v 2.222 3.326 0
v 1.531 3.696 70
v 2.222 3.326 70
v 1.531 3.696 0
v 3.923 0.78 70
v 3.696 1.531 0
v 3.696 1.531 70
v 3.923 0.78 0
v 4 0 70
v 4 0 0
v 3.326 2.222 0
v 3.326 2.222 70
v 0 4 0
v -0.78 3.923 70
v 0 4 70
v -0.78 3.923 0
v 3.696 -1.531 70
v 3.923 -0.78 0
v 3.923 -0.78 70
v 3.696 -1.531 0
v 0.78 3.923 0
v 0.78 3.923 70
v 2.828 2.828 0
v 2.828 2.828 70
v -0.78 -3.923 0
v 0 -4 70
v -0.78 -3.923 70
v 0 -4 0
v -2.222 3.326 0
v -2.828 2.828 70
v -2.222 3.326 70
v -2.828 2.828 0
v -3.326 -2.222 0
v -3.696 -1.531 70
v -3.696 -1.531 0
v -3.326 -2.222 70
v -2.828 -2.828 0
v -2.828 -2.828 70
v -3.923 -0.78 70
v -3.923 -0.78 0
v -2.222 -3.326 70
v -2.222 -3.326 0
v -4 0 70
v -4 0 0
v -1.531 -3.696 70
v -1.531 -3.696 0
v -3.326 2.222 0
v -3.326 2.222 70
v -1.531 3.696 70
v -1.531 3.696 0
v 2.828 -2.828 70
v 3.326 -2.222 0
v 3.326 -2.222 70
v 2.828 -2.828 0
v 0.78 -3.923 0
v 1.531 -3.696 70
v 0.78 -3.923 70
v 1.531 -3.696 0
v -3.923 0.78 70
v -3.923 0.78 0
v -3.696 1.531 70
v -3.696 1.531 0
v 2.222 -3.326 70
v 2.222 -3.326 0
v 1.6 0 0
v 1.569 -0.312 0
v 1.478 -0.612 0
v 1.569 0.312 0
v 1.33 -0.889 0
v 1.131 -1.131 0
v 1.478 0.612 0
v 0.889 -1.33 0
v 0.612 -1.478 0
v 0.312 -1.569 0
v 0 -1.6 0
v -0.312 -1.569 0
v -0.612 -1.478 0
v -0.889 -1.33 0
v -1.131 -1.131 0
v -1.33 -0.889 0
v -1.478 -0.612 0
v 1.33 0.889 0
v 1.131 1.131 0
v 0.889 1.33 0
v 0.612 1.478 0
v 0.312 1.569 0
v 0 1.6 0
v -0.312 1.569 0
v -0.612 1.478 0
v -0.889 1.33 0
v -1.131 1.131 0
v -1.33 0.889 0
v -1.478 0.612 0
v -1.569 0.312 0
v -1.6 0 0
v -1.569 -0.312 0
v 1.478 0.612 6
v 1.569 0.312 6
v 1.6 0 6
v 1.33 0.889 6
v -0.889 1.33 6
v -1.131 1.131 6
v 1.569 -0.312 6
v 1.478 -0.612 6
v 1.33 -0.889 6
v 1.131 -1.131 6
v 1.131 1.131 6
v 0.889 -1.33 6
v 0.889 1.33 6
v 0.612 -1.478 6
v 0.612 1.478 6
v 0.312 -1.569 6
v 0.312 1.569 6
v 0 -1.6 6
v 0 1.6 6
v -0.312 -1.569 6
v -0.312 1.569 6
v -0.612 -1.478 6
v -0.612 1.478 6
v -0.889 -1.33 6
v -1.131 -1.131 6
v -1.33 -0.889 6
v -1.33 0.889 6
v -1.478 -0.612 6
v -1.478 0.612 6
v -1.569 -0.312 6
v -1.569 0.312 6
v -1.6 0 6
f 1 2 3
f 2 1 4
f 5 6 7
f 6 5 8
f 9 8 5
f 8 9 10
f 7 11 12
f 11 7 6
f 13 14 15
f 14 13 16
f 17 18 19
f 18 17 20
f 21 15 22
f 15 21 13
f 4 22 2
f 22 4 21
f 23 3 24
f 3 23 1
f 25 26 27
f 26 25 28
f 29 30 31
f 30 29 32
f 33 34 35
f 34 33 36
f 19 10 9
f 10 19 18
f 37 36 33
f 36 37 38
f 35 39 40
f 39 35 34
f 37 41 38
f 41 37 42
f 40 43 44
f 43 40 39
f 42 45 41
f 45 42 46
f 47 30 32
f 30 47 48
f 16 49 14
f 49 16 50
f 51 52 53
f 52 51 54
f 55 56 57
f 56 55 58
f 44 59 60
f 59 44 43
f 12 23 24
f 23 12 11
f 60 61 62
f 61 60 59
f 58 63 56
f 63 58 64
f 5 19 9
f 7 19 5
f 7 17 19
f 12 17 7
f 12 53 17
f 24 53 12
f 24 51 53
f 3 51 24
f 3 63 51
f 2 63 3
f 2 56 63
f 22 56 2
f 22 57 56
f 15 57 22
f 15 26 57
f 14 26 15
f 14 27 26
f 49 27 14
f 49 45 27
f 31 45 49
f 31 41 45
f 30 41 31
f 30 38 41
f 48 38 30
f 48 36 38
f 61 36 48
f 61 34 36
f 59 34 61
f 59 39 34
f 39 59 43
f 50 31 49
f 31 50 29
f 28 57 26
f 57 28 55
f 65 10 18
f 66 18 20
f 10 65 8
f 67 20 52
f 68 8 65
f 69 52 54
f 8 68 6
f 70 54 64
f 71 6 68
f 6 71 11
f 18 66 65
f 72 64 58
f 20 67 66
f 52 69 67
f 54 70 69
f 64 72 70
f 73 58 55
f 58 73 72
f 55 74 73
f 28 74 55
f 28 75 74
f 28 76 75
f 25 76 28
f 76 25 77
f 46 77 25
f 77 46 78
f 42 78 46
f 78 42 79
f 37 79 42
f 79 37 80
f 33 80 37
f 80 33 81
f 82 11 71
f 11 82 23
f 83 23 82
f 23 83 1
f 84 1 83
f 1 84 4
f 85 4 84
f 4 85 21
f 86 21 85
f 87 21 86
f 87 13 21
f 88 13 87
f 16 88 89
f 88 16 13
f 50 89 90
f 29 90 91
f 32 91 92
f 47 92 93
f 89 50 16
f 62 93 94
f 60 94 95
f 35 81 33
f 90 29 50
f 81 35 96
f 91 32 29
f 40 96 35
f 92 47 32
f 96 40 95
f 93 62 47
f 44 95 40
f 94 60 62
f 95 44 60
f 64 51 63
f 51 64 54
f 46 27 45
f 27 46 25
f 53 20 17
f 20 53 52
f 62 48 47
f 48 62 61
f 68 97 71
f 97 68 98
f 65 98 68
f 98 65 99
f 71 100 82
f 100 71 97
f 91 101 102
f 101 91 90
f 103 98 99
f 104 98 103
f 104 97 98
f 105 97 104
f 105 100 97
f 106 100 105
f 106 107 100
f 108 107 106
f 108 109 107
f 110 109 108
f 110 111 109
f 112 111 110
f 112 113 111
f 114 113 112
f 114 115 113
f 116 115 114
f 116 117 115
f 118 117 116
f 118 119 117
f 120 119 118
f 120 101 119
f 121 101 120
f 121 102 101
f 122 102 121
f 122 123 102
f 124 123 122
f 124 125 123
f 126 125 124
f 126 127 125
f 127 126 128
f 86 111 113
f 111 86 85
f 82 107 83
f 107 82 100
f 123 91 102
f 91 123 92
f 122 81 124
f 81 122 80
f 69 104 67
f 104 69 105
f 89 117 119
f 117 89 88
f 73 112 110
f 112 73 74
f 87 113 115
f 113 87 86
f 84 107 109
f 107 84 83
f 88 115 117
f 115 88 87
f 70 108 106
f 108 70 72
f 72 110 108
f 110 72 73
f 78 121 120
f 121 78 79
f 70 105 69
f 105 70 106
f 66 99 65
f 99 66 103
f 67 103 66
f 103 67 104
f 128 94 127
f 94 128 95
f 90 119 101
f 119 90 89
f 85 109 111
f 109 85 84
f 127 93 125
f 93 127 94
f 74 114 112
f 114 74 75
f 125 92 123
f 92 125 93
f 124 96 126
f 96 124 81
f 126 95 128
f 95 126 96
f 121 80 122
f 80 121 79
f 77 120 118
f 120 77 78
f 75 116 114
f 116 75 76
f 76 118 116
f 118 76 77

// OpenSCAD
// file: ../dimensions.scad
// Shared dimensions for all case configurations
// This file defines common Mini-ITX parameters used across all configs
// Config-specific dimensions are in dimensions_minimal.scad and dimensions_pico.scad

// --- Wall and Material ---
wall_thickness = 3;

// --- Motherboard (Mini-ITX) ---
mobo_width = 170;
mobo_depth = 170;
mobo_pcb_thickness = 1.6;

// --- Standoffs ---
standoff_height = 6;  // Female thread portion of M3x10+6mm male-female standoff
standoff_hole_radius = 1.6;  // M3 clearance (deprecated - see integrated bottom panel design)
standoff_locations = [
    [5, 5],       // Front-left: 5mm from left, 5mm from front
    [165, 5],     // Front-right: 5mm from right, 5mm from front
    [5, 160],     // Back-left: 5mm from left, 10mm from back
    [165, 137]    // Back-right: 5mm from right, 33mm from back
];

// --- Standoff Hexagonal Receptacles (Integrated Bottom Panel Design) ---
standoff_boss_height = 2.5;              // Height of hex boss above panel interior surface
standoff_hex_size_flat_to_flat = 5;     // Hex size for standoff base (flat-to-flat)
standoff_hex_size_point_to_point = 6.35; // Hex size point-to-point (calculated from F-F)
standoff_pocket_depth = 2.2;             // Depth of hex recess for screw head
standoff_boss_diameter = 6.85;           // Overall boss diameter (hex point + FDM tolerance)
standoff_mounting_screw_length = 8;      // M3 x 8mm cap screw (recommended)
standoff_screw_clearance_hole = 3.3;     // M3 clearance hole + FDM tolerance

// --- I/O Shield ---
io_shield_width = 158.75;   // 6.25 inches (standard ATX)
io_shield_height = 44.45;   // 1.75 inches (standard ATX)
io_shield_x_offset = (mobo_width - io_shield_width) / 2;
io_shield_z_offset = 5;     // 5mm from bottom of plate

// --- Backplate ---
backplate_height = 88.9;    // 3.5 inches
backplate_thickness = wall_thickness;

// --- Ventilation ---
honeycomb_radius = 3;
vent_padding = 5;

// --- Screw Holes for Panel Assembly ---
panel_screw_radius = 1.6;  // M3
panel_screw_inset = 8;     // Distance from edge
// file: ../dimensions_minimal.scad
// Minimal/NAS Configuration Dimensions
// Includes shared base dimensions and adds minimal/NAS-specific parameters

include <dimensions.scad>

// --- CPU Cooler (Noctua NH-L12S) - Minimal/NAS configurations ---
cooler_width = 128;
cooler_depth = 146;
cooler_base_height = 35;      // Base plate and heatpipes
cooler_fan_height = 15;       // 120mm x 15mm fan (NF-A12x15)
cooler_fins_height = 20;      // Heatsink fins on top
cooler_total_height = cooler_base_height + cooler_fan_height + cooler_fins_height;  // 70mm

// --- Power Supplies ---
// Flex ATX (from technical drawing)
// Standing orientation: 40mm wide (X), 150mm deep (Y), 80mm tall (Z)
flex_atx_width = 40.0;      // A: Width (X - thin side, standing)
flex_atx_length = 150.0;    // B: Length (Y - depth)
flex_atx_height = 80.0;     // G: Height (Z - tall side, standing)

// Flex ATX Mounting holes - 8-32 UNC thread (4 places on rear 40x80mm face)
flex_atx_mount_hole_radius = 2.1;   // 8-32 clearance (~4.2mm dia)
flex_atx_mount_x_inset = 5;         // Distance from left/right edges
flex_atx_mount_z_inset = 5;         // Distance from top/bottom edges

// Calculated mounting hole positions (X, Z pairs relative to PSU origin)
// Note: Only 3 holes - top-right (coords) removed where C14 inlet is located
flex_atx_mount_holes = [
    [flex_atx_mount_x_inset, flex_atx_mount_z_inset],
    [flex_atx_width - flex_atx_mount_x_inset, flex_atx_mount_z_inset],
    [flex_atx_mount_x_inset, flex_atx_height - flex_atx_mount_z_inset]
];

// SFX
sfx_length = 125;
sfx_width = 100;
sfx_height = 63.5;

// --- HDD 3.5" Dimensions ---
hdd_width = 101.6;
hdd_length = 147;
hdd_height = 26.1;

// --- NAS 2-Disk Config ---
nas_2disk_rail_width = 2;
nas_2disk_gap = 5;
nas_2disk_padding = 2;
nas_2disk_bay_width = hdd_width + 2 * nas_2disk_rail_width;
nas_2disk_inner_width = 2 * nas_2disk_bay_width + nas_2disk_gap;
nas_2disk_width = nas_2disk_inner_width + 2 * (wall_thickness + nas_2disk_padding);

// --- PSU Compartment ---
flex_atx_standing_width = flex_atx_width;
psu_compartment_width = nas_2disk_width - mobo_width;

// --- Interior Chamber Height (standoffs + motherboard + cooler) ---
interior_chamber_height = standoff_height + mobo_pcb_thickness + cooler_total_height;

// --- Minimal Config External Dimensions ---
minimal_mobo_exterior_width = mobo_width + 2 * wall_thickness;
minimal_mobo_exterior_depth = mobo_depth + 2 * wall_thickness;
minimal_exterior_height = interior_chamber_height + 2 * wall_thickness;

// With Flex ATX PSU next to motherboard
minimal_with_psu_width = nas_2disk_width;

// --- Interior Panel Dimensions (top/bottom panels fit between walls) ---
interior_panel_width = minimal_with_psu_width - 2 * wall_thickness;
interior_panel_depth = mobo_depth;

// --- Side Panel Dimensions (left/right panels form exterior walls) ---
side_panel_height = minimal_exterior_height;
side_panel_depth = mobo_depth + 2 * wall_thickness;

// --- Front/Back Panel Dimensions ---
front_back_panel_width = interior_panel_width;
front_back_panel_height = side_panel_height;

// --- GPU ---
gpu_length = 320;
gpu_height = 140;
gpu_width = 60;

// --- GPU Config External Dimensions ---
gpu_config_width = 171;
gpu_config_depth = 378;
gpu_config_height = 190;

// --- Fans ---
fan_120_size = 120;
fan_120_thickness = 25;
fan_140_size = 140;
fan_140_thickness = 25;

// --- AIO Radiator ---
radiator_240_length = 275;
radiator_240_width = 120;
radiator_240_thickness = 27;

// --- NAS Many-Disk Config ---
nas_many_drive_count = 6;
nas_many_drive_spacing = 5;
nas_many_enclosure_height = hdd_width + wall_thickness + 5;

// --- Power Inlet C14 ---
c14_width = 50;
c14_height = 27;
c14_depth = 30;

// --- Open Air Frame ---
frame_cylinder_height = interior_chamber_height - standoff_height - mobo_pcb_thickness;
frame_cylinder_outer_diameter = 8;
frame_cylinder_inner_diameter = 3.2;
frame_cylinder_thread_depth = 6;
// main file
// Frame Cylinder - Open Air Frame Component
// Free-floating cylinder that screws onto extended standoff male studs
// Provides mounting point for upper frame and panels

include <../dimensions_minimal.scad>

// Color for 3D printed parts
cylinder_color = [0.3, 0.3, 0.3];  // Dark gray

// --- Module: Frame Cylinder ---
// Creates a single frame cylinder
// - Bottom has internal threads (thread_depth) to screw onto standoff stud
// - Total height = frame_cylinder_height (derived from interior_chamber_height)
// - Top surface provides panel attachment point
module frame_cylinder() {
    color(cylinder_color) {
        difference() {
            // Outer cylinder body
            cylinder(h=frame_cylinder_height, d=frame_cylinder_outer_diameter, $fn=32);

            // Internal thread hole (full depth for standoff stud engagement)
            translate([0, 0, -0.1])
                cylinder(h=frame_cylinder_thread_depth + 0.1, d=frame_cylinder_inner_diameter, $fn=32);
        }
    }
}

// --- Module: Frame Cylinders at Mini-ITX locations ---
// Places frame cylinders at all 4 Mini-ITX standoff positions
// Positioned at motherboard surface height (on top of extended standoff studs)
module frame_cylinders() {
    for (pos = standoff_locations) {
        translate([pos[0], pos[1], 0])
            frame_cylinder();
    }
}

// Preview
frame_cylinder();
